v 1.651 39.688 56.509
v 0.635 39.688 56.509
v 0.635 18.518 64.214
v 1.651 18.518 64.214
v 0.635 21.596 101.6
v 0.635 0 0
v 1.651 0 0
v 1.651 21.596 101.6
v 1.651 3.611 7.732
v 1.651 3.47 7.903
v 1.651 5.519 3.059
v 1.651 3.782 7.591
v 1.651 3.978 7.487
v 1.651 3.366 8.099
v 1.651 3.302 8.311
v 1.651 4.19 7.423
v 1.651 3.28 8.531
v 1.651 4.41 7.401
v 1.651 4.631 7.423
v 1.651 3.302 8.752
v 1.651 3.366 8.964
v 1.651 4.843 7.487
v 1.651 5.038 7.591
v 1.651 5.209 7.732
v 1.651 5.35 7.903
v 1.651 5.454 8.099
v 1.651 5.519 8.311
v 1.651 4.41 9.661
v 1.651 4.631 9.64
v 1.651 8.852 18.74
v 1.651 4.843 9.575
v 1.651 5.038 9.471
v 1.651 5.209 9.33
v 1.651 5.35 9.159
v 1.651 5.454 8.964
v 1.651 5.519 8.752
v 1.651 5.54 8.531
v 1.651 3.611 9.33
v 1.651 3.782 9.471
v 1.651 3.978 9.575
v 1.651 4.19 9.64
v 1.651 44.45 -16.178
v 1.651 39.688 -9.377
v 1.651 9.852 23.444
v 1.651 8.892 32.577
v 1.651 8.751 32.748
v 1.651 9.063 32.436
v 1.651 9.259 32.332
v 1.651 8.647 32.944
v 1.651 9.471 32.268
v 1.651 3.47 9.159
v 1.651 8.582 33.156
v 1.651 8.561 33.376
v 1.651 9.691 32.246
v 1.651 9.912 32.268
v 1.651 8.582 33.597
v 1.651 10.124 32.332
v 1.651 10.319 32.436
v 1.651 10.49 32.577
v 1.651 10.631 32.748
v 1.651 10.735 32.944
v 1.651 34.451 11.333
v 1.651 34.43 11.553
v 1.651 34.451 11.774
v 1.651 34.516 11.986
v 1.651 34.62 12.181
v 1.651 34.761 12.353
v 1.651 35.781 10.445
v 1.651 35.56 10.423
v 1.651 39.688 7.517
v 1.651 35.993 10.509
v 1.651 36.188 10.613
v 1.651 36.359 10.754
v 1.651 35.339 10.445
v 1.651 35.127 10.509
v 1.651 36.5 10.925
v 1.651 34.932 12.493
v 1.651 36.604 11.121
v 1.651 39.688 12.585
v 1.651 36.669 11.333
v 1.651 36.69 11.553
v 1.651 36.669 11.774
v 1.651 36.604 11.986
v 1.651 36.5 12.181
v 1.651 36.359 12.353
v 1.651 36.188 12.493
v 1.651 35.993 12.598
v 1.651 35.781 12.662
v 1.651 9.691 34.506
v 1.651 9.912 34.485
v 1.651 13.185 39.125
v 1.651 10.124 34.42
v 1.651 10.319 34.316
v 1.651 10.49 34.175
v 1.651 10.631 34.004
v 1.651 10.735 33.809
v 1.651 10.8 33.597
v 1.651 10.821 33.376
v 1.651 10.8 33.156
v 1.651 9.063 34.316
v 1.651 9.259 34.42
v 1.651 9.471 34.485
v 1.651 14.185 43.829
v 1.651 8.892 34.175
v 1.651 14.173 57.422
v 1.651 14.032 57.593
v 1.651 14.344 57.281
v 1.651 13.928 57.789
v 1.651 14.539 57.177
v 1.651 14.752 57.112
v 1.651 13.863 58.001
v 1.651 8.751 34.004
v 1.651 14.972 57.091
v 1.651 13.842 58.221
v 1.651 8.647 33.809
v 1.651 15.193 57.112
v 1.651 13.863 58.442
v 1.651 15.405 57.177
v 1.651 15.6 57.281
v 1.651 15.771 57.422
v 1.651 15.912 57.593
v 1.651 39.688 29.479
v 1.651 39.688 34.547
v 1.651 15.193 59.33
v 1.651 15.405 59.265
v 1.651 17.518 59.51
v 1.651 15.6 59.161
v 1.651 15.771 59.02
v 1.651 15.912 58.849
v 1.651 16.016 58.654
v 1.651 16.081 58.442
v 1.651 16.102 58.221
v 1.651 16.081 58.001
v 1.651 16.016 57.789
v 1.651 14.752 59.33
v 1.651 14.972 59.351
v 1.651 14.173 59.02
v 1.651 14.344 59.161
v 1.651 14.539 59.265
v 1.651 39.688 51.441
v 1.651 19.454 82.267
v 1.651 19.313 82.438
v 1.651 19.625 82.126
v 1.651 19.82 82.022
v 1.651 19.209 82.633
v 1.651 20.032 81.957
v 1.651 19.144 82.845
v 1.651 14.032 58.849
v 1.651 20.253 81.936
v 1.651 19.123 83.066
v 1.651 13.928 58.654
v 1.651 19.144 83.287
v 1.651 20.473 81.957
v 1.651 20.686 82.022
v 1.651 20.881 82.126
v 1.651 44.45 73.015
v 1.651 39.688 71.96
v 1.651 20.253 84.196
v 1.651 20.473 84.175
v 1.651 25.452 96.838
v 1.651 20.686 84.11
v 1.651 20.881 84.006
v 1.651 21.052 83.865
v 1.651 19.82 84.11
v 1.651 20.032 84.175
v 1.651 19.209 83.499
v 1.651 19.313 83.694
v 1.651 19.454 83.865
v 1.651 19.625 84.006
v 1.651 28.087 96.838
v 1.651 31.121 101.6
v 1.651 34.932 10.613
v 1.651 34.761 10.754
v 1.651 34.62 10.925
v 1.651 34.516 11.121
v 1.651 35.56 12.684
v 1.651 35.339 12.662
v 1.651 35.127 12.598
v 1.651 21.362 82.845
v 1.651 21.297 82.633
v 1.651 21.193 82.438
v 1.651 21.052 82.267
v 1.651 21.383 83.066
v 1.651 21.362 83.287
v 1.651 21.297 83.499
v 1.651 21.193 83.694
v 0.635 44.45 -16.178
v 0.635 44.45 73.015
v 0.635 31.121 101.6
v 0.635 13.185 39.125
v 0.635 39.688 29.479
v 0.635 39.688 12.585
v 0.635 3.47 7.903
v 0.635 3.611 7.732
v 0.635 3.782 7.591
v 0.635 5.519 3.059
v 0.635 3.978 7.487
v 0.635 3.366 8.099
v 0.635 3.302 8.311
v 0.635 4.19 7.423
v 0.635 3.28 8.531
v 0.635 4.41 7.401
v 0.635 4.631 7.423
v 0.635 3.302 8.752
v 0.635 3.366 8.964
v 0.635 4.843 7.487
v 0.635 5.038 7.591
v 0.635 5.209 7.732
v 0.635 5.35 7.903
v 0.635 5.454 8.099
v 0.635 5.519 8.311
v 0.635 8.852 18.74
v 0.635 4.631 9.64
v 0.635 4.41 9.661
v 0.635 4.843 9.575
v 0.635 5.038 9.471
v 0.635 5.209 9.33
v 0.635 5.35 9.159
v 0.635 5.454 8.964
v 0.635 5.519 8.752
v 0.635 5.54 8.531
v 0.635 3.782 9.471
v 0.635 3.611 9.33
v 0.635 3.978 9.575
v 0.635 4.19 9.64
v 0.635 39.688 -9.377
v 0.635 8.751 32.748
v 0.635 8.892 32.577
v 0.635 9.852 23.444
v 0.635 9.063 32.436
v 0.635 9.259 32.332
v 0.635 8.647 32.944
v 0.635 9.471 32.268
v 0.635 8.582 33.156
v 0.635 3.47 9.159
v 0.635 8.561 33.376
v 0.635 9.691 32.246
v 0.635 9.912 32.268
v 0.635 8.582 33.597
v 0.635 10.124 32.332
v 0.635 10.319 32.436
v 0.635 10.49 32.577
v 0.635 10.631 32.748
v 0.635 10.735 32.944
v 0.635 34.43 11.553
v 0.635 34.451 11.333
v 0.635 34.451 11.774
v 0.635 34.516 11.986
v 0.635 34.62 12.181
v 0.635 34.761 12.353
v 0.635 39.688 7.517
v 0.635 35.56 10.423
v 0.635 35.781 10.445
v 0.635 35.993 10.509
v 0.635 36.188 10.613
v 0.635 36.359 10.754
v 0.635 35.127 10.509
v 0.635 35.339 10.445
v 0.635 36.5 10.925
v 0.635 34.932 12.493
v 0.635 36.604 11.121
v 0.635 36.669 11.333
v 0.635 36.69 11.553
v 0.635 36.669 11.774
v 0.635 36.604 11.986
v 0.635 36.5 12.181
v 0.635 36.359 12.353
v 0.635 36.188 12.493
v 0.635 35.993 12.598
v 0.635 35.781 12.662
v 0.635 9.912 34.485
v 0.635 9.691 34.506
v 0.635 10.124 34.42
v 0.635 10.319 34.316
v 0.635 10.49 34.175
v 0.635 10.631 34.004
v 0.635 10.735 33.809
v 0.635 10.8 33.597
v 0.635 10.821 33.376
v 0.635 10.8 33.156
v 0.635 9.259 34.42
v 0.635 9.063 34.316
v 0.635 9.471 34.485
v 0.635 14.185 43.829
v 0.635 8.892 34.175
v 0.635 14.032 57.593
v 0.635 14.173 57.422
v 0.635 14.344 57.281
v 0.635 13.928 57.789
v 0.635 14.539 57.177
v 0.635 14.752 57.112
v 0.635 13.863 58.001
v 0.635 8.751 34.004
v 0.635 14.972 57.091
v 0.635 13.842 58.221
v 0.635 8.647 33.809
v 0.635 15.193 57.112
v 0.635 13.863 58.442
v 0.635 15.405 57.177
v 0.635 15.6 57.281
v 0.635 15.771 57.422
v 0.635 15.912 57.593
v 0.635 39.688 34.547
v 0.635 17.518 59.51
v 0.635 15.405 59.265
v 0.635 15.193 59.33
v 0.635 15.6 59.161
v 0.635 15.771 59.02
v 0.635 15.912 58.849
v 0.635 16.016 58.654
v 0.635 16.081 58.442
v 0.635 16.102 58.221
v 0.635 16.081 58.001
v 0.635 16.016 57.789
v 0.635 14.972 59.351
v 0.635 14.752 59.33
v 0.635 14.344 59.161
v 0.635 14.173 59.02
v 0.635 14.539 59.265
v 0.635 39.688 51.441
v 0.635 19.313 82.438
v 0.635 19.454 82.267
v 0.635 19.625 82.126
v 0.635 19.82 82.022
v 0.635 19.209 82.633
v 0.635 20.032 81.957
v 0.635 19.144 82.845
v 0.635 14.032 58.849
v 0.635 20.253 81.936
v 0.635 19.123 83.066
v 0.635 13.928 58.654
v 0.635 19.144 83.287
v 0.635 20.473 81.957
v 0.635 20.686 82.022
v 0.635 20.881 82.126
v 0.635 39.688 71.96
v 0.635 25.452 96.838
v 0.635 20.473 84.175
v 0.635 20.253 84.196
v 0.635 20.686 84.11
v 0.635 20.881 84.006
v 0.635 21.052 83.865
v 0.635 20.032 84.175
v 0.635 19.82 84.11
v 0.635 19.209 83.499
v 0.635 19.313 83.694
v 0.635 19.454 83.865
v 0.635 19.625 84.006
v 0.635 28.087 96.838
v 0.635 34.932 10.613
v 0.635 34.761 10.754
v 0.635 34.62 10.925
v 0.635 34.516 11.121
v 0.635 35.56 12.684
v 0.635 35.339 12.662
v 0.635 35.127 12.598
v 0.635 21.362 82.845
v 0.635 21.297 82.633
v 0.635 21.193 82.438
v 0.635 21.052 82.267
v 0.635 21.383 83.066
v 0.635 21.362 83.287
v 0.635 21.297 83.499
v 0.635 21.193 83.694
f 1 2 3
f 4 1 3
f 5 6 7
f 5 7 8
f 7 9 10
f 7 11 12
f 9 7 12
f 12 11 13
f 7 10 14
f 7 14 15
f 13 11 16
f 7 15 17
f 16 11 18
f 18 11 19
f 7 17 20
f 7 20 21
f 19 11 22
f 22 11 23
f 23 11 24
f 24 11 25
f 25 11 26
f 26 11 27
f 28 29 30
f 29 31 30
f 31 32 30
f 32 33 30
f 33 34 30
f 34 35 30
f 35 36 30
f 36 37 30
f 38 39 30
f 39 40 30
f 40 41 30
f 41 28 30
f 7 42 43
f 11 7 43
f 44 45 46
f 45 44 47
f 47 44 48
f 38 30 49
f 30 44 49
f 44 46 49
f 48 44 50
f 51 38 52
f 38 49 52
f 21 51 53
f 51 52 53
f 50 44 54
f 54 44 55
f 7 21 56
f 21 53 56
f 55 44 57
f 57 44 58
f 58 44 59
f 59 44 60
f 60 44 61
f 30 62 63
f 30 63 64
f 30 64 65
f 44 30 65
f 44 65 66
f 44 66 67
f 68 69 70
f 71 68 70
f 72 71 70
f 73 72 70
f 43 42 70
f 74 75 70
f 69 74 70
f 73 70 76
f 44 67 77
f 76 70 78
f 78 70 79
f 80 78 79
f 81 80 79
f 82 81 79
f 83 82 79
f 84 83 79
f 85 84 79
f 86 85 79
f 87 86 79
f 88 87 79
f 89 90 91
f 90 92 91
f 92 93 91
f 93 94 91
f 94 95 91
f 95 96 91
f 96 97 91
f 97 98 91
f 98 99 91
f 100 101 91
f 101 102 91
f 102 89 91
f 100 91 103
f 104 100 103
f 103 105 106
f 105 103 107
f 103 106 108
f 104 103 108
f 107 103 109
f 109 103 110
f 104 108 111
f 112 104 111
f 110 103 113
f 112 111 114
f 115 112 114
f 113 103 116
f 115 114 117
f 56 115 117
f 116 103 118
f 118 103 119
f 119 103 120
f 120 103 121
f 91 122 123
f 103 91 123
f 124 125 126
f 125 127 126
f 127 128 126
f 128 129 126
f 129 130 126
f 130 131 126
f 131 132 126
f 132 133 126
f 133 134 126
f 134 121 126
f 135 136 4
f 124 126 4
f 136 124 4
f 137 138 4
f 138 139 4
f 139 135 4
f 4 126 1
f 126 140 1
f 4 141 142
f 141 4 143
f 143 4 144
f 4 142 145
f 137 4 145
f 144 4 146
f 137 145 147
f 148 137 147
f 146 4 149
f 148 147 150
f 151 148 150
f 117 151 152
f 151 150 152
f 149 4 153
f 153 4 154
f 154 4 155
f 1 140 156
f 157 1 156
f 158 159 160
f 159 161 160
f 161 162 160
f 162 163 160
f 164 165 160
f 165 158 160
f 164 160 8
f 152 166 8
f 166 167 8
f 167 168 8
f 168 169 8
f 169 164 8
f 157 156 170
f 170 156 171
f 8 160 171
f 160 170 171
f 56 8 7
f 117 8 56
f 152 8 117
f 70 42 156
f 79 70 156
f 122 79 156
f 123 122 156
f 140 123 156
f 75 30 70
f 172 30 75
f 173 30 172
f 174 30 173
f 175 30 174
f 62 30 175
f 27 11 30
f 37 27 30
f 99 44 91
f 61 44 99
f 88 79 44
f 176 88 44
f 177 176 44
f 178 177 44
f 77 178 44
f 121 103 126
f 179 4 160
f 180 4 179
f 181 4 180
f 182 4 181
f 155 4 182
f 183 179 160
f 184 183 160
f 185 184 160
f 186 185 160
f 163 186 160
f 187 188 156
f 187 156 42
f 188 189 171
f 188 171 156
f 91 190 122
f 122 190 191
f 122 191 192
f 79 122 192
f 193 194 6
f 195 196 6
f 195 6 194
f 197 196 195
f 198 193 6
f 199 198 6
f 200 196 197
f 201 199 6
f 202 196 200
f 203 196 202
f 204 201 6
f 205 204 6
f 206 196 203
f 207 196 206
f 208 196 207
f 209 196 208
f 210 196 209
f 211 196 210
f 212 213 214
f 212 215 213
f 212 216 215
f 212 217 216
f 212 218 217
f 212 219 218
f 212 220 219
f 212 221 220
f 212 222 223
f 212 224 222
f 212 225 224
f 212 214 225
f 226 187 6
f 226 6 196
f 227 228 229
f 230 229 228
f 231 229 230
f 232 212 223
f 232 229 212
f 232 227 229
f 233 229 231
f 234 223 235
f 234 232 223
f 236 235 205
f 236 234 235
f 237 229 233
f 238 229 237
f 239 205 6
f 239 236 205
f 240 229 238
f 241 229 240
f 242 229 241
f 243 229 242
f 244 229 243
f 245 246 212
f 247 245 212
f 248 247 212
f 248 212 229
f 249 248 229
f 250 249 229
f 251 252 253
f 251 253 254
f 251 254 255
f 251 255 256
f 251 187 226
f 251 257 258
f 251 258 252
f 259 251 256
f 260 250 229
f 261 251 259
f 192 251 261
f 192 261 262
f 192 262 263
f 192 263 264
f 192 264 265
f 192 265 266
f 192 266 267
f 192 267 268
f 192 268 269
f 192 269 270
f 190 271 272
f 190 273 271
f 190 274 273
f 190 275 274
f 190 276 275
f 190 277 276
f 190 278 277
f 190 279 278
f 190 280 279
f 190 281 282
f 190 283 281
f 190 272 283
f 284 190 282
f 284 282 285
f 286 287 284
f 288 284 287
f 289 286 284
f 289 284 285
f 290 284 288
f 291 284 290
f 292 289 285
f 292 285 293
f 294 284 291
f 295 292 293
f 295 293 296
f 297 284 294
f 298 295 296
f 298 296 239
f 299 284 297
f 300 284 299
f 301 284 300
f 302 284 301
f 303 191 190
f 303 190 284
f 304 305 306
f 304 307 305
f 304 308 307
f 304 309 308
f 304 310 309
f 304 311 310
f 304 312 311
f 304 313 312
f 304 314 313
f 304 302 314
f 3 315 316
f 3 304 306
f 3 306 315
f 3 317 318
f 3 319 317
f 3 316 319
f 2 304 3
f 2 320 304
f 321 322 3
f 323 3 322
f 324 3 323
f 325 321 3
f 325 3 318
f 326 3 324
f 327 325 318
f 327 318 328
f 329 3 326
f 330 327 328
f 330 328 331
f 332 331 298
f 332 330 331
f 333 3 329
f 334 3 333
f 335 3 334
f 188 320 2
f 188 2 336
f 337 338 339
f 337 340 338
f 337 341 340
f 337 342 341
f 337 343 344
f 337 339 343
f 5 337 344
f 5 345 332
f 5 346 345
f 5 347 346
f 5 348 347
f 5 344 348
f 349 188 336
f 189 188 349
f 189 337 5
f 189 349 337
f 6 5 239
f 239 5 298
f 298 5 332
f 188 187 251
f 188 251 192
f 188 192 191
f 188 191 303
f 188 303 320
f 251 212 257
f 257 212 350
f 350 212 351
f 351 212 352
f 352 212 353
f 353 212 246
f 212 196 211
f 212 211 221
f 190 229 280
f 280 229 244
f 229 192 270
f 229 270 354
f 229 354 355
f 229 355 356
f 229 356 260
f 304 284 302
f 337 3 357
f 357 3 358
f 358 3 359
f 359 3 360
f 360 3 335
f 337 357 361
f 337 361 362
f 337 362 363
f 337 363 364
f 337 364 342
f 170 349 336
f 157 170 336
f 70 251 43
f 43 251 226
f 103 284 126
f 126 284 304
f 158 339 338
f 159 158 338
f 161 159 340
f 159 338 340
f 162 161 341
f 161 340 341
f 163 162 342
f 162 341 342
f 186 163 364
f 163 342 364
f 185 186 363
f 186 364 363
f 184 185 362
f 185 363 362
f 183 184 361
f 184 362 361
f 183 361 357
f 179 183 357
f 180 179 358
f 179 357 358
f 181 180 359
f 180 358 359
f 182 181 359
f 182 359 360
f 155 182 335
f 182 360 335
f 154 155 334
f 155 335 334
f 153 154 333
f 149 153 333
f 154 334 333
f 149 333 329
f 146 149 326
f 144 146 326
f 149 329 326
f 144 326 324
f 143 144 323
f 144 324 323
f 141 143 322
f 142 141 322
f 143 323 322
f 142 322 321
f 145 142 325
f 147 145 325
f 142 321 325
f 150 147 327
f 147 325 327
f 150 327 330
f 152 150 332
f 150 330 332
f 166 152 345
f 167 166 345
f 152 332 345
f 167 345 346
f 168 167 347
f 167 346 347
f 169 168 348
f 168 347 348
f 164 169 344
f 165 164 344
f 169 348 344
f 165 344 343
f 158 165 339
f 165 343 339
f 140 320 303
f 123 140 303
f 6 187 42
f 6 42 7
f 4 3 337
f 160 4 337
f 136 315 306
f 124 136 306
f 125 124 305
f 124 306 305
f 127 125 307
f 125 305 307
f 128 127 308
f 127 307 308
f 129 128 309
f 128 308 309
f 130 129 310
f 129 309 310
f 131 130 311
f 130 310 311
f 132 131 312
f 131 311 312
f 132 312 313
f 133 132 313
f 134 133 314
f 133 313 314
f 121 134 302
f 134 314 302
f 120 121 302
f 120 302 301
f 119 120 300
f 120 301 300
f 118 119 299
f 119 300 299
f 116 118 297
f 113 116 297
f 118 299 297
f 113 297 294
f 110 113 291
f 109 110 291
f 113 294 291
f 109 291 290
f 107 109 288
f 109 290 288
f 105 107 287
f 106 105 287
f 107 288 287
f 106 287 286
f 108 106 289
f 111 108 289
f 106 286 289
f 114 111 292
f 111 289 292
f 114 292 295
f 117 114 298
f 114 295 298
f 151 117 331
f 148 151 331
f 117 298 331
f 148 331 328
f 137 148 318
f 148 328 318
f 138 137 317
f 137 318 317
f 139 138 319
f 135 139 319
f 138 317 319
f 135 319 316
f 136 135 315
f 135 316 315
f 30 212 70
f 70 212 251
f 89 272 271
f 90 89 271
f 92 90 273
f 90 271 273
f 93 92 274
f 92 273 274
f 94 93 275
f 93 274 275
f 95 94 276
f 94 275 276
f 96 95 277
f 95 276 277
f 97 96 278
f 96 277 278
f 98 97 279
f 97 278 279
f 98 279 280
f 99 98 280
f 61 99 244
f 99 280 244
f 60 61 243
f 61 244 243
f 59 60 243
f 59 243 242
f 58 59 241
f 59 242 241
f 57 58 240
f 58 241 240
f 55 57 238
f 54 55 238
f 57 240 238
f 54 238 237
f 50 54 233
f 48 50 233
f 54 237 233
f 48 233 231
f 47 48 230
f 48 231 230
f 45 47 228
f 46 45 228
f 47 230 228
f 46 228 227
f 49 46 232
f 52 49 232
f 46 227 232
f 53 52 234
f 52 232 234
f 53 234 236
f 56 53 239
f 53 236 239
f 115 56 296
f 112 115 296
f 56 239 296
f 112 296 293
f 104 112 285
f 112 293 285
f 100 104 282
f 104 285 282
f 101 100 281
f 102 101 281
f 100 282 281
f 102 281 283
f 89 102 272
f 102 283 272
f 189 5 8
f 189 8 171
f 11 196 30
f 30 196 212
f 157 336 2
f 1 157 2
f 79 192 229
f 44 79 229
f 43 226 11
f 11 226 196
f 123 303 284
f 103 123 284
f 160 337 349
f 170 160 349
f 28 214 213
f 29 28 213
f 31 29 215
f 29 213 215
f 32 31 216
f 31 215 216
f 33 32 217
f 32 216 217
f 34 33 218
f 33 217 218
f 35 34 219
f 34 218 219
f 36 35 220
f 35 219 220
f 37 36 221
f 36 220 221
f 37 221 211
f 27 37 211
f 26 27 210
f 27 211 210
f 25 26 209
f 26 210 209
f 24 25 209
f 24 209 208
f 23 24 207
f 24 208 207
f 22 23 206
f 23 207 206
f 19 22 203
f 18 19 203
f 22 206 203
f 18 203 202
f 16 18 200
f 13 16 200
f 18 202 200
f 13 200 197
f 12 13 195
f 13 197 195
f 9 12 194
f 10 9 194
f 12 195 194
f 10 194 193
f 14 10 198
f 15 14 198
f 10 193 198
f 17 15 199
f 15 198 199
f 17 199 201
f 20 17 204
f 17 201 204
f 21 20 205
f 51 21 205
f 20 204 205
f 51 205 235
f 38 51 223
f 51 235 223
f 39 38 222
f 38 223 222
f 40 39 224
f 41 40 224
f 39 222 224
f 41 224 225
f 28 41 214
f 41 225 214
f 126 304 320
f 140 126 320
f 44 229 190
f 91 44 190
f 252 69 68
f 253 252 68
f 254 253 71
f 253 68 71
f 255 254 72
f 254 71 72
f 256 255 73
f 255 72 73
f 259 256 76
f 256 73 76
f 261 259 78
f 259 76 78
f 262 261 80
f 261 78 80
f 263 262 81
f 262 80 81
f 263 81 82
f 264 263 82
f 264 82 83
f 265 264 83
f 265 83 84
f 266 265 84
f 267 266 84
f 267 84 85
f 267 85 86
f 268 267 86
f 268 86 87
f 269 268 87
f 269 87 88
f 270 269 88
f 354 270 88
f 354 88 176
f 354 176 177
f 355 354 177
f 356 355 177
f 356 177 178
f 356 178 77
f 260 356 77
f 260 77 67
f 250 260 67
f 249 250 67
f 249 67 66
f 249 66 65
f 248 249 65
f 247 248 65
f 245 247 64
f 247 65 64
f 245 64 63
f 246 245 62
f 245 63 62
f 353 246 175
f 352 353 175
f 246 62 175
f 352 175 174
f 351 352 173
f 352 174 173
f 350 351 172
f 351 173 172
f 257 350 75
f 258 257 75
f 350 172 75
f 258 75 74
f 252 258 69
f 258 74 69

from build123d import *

# Parameters (mm, degrees)
EXTRUDE1_DEPTH     = 0.635
SKETCH2_R          = 1.5875
EXTRUDE2_DEPTH     = 1.635
SKETCH3_R          = 1.1303
EXTRUDE3_DEPTH     = 1.016
EXTRUDE4_DEPTH     = 0.635
SKETCH5_R          = 1.1303
CUT_EXTRUDE1_DEPTH = 2.016


with BuildPart() as part:
    # Sketch1 → Extrude1 (new body)
    with BuildSketch(Plane(origin=(0, 0, 0), x_dir=(0, 0, -1), z_dir=(1, 0, 0))):
        Polygon((16.178476913, 44.45), (0, 0), (-101.6, 21.595746666), (-101.6, 31.120746666), (-73.015323979, 44.45), align=None)
    extrude(amount=EXTRUDE1_DEPTH)

    # Sketch2 → Extrude2 (cut, through all)
    with BuildSketch(Plane.ZY):
        with Locations((8.531149291, 4.410096871)):
            Circle(SKETCH2_R)
        with Locations((33.37609835, 9.691053818)):
            Circle(SKETCH2_R)
        with Locations((58.221047409, 14.972010765)):
            Circle(SKETCH2_R)
        with Locations((83.065996467, 20.252967712)):
            Circle(SKETCH2_R)
    extrude(amount=-EXTRUDE2_DEPTH, mode=Mode.SUBTRACT)

    # Sketch4 → Extrude4 (cut)
    with BuildSketch(Plane.ZY):
        Polygon((73.015323979, 44.45), (-16.178476913, 44.45), (0, 0), (101.6, 21.595746666), (101.6, 31.120746666), align=None)
    extrude(amount=-EXTRUDE4_DEPTH, mode=Mode.SUBTRACT)


with BuildPart() as body_2:
    # Sketch3 → Extrude3 (new body)
    with BuildSketch(Plane.ZY.offset(-0.635)):
        Polygon((-16.178476913, 44.45), (0, 0), (101.6, 21.595746666), (101.6, 31.120746666), (73.015323979, 44.45), align=None)
        with Locations((8.531149291, 4.410096871)):
            Circle(SKETCH3_R, mode=Mode.SUBTRACT)
        with Locations((33.37609835, 9.691053818)):
            Circle(SKETCH3_R, mode=Mode.SUBTRACT)
        with Locations((58.221047409, 14.972010765)):
            Circle(SKETCH3_R, mode=Mode.SUBTRACT)
        with Locations((83.065996467, 20.252967712)):
            Circle(SKETCH3_R, mode=Mode.SUBTRACT)
        Polygon((7.516900107, 39.6875), (-9.376922031, 39.6875), (3.059330207, 5.519177793), (18.74002683, 8.852212752), align=None, mode=Mode.SUBTRACT)
        Polygon((23.444235817, 9.852123239), (39.124932441, 13.185158198), (29.478868887, 39.6875), (12.585046748, 39.6875), align=None, mode=Mode.SUBTRACT)
        Polygon((34.547015528, 39.6875), (43.829141428, 14.185068686), (59.509838051, 17.518103645), (51.440837666, 39.6875), align=None, mode=Mode.SUBTRACT)
        Polygon((56.508984307, 39.6875), (64.214047038, 18.518014132), (96.8375, 25.452343124), (96.8375, 28.086699549), (71.959503148, 39.6875), align=None, mode=Mode.SUBTRACT)
    extrude(amount=-EXTRUDE3_DEPTH)

    # Sketch5 → Cut-Extrude1 (cut, through all)
    with BuildSketch(Plane(origin=(1.651, 0, 0), x_dir=(0, 0, -1), z_dir=(1, 0, 0))):
        with Locations((-11.55326057, 35.56)):
            Circle(SKETCH5_R)
    extrude(amount=-CUT_EXTRUDE1_DEPTH, mode=Mode.SUBTRACT)


solid = body_2.part
